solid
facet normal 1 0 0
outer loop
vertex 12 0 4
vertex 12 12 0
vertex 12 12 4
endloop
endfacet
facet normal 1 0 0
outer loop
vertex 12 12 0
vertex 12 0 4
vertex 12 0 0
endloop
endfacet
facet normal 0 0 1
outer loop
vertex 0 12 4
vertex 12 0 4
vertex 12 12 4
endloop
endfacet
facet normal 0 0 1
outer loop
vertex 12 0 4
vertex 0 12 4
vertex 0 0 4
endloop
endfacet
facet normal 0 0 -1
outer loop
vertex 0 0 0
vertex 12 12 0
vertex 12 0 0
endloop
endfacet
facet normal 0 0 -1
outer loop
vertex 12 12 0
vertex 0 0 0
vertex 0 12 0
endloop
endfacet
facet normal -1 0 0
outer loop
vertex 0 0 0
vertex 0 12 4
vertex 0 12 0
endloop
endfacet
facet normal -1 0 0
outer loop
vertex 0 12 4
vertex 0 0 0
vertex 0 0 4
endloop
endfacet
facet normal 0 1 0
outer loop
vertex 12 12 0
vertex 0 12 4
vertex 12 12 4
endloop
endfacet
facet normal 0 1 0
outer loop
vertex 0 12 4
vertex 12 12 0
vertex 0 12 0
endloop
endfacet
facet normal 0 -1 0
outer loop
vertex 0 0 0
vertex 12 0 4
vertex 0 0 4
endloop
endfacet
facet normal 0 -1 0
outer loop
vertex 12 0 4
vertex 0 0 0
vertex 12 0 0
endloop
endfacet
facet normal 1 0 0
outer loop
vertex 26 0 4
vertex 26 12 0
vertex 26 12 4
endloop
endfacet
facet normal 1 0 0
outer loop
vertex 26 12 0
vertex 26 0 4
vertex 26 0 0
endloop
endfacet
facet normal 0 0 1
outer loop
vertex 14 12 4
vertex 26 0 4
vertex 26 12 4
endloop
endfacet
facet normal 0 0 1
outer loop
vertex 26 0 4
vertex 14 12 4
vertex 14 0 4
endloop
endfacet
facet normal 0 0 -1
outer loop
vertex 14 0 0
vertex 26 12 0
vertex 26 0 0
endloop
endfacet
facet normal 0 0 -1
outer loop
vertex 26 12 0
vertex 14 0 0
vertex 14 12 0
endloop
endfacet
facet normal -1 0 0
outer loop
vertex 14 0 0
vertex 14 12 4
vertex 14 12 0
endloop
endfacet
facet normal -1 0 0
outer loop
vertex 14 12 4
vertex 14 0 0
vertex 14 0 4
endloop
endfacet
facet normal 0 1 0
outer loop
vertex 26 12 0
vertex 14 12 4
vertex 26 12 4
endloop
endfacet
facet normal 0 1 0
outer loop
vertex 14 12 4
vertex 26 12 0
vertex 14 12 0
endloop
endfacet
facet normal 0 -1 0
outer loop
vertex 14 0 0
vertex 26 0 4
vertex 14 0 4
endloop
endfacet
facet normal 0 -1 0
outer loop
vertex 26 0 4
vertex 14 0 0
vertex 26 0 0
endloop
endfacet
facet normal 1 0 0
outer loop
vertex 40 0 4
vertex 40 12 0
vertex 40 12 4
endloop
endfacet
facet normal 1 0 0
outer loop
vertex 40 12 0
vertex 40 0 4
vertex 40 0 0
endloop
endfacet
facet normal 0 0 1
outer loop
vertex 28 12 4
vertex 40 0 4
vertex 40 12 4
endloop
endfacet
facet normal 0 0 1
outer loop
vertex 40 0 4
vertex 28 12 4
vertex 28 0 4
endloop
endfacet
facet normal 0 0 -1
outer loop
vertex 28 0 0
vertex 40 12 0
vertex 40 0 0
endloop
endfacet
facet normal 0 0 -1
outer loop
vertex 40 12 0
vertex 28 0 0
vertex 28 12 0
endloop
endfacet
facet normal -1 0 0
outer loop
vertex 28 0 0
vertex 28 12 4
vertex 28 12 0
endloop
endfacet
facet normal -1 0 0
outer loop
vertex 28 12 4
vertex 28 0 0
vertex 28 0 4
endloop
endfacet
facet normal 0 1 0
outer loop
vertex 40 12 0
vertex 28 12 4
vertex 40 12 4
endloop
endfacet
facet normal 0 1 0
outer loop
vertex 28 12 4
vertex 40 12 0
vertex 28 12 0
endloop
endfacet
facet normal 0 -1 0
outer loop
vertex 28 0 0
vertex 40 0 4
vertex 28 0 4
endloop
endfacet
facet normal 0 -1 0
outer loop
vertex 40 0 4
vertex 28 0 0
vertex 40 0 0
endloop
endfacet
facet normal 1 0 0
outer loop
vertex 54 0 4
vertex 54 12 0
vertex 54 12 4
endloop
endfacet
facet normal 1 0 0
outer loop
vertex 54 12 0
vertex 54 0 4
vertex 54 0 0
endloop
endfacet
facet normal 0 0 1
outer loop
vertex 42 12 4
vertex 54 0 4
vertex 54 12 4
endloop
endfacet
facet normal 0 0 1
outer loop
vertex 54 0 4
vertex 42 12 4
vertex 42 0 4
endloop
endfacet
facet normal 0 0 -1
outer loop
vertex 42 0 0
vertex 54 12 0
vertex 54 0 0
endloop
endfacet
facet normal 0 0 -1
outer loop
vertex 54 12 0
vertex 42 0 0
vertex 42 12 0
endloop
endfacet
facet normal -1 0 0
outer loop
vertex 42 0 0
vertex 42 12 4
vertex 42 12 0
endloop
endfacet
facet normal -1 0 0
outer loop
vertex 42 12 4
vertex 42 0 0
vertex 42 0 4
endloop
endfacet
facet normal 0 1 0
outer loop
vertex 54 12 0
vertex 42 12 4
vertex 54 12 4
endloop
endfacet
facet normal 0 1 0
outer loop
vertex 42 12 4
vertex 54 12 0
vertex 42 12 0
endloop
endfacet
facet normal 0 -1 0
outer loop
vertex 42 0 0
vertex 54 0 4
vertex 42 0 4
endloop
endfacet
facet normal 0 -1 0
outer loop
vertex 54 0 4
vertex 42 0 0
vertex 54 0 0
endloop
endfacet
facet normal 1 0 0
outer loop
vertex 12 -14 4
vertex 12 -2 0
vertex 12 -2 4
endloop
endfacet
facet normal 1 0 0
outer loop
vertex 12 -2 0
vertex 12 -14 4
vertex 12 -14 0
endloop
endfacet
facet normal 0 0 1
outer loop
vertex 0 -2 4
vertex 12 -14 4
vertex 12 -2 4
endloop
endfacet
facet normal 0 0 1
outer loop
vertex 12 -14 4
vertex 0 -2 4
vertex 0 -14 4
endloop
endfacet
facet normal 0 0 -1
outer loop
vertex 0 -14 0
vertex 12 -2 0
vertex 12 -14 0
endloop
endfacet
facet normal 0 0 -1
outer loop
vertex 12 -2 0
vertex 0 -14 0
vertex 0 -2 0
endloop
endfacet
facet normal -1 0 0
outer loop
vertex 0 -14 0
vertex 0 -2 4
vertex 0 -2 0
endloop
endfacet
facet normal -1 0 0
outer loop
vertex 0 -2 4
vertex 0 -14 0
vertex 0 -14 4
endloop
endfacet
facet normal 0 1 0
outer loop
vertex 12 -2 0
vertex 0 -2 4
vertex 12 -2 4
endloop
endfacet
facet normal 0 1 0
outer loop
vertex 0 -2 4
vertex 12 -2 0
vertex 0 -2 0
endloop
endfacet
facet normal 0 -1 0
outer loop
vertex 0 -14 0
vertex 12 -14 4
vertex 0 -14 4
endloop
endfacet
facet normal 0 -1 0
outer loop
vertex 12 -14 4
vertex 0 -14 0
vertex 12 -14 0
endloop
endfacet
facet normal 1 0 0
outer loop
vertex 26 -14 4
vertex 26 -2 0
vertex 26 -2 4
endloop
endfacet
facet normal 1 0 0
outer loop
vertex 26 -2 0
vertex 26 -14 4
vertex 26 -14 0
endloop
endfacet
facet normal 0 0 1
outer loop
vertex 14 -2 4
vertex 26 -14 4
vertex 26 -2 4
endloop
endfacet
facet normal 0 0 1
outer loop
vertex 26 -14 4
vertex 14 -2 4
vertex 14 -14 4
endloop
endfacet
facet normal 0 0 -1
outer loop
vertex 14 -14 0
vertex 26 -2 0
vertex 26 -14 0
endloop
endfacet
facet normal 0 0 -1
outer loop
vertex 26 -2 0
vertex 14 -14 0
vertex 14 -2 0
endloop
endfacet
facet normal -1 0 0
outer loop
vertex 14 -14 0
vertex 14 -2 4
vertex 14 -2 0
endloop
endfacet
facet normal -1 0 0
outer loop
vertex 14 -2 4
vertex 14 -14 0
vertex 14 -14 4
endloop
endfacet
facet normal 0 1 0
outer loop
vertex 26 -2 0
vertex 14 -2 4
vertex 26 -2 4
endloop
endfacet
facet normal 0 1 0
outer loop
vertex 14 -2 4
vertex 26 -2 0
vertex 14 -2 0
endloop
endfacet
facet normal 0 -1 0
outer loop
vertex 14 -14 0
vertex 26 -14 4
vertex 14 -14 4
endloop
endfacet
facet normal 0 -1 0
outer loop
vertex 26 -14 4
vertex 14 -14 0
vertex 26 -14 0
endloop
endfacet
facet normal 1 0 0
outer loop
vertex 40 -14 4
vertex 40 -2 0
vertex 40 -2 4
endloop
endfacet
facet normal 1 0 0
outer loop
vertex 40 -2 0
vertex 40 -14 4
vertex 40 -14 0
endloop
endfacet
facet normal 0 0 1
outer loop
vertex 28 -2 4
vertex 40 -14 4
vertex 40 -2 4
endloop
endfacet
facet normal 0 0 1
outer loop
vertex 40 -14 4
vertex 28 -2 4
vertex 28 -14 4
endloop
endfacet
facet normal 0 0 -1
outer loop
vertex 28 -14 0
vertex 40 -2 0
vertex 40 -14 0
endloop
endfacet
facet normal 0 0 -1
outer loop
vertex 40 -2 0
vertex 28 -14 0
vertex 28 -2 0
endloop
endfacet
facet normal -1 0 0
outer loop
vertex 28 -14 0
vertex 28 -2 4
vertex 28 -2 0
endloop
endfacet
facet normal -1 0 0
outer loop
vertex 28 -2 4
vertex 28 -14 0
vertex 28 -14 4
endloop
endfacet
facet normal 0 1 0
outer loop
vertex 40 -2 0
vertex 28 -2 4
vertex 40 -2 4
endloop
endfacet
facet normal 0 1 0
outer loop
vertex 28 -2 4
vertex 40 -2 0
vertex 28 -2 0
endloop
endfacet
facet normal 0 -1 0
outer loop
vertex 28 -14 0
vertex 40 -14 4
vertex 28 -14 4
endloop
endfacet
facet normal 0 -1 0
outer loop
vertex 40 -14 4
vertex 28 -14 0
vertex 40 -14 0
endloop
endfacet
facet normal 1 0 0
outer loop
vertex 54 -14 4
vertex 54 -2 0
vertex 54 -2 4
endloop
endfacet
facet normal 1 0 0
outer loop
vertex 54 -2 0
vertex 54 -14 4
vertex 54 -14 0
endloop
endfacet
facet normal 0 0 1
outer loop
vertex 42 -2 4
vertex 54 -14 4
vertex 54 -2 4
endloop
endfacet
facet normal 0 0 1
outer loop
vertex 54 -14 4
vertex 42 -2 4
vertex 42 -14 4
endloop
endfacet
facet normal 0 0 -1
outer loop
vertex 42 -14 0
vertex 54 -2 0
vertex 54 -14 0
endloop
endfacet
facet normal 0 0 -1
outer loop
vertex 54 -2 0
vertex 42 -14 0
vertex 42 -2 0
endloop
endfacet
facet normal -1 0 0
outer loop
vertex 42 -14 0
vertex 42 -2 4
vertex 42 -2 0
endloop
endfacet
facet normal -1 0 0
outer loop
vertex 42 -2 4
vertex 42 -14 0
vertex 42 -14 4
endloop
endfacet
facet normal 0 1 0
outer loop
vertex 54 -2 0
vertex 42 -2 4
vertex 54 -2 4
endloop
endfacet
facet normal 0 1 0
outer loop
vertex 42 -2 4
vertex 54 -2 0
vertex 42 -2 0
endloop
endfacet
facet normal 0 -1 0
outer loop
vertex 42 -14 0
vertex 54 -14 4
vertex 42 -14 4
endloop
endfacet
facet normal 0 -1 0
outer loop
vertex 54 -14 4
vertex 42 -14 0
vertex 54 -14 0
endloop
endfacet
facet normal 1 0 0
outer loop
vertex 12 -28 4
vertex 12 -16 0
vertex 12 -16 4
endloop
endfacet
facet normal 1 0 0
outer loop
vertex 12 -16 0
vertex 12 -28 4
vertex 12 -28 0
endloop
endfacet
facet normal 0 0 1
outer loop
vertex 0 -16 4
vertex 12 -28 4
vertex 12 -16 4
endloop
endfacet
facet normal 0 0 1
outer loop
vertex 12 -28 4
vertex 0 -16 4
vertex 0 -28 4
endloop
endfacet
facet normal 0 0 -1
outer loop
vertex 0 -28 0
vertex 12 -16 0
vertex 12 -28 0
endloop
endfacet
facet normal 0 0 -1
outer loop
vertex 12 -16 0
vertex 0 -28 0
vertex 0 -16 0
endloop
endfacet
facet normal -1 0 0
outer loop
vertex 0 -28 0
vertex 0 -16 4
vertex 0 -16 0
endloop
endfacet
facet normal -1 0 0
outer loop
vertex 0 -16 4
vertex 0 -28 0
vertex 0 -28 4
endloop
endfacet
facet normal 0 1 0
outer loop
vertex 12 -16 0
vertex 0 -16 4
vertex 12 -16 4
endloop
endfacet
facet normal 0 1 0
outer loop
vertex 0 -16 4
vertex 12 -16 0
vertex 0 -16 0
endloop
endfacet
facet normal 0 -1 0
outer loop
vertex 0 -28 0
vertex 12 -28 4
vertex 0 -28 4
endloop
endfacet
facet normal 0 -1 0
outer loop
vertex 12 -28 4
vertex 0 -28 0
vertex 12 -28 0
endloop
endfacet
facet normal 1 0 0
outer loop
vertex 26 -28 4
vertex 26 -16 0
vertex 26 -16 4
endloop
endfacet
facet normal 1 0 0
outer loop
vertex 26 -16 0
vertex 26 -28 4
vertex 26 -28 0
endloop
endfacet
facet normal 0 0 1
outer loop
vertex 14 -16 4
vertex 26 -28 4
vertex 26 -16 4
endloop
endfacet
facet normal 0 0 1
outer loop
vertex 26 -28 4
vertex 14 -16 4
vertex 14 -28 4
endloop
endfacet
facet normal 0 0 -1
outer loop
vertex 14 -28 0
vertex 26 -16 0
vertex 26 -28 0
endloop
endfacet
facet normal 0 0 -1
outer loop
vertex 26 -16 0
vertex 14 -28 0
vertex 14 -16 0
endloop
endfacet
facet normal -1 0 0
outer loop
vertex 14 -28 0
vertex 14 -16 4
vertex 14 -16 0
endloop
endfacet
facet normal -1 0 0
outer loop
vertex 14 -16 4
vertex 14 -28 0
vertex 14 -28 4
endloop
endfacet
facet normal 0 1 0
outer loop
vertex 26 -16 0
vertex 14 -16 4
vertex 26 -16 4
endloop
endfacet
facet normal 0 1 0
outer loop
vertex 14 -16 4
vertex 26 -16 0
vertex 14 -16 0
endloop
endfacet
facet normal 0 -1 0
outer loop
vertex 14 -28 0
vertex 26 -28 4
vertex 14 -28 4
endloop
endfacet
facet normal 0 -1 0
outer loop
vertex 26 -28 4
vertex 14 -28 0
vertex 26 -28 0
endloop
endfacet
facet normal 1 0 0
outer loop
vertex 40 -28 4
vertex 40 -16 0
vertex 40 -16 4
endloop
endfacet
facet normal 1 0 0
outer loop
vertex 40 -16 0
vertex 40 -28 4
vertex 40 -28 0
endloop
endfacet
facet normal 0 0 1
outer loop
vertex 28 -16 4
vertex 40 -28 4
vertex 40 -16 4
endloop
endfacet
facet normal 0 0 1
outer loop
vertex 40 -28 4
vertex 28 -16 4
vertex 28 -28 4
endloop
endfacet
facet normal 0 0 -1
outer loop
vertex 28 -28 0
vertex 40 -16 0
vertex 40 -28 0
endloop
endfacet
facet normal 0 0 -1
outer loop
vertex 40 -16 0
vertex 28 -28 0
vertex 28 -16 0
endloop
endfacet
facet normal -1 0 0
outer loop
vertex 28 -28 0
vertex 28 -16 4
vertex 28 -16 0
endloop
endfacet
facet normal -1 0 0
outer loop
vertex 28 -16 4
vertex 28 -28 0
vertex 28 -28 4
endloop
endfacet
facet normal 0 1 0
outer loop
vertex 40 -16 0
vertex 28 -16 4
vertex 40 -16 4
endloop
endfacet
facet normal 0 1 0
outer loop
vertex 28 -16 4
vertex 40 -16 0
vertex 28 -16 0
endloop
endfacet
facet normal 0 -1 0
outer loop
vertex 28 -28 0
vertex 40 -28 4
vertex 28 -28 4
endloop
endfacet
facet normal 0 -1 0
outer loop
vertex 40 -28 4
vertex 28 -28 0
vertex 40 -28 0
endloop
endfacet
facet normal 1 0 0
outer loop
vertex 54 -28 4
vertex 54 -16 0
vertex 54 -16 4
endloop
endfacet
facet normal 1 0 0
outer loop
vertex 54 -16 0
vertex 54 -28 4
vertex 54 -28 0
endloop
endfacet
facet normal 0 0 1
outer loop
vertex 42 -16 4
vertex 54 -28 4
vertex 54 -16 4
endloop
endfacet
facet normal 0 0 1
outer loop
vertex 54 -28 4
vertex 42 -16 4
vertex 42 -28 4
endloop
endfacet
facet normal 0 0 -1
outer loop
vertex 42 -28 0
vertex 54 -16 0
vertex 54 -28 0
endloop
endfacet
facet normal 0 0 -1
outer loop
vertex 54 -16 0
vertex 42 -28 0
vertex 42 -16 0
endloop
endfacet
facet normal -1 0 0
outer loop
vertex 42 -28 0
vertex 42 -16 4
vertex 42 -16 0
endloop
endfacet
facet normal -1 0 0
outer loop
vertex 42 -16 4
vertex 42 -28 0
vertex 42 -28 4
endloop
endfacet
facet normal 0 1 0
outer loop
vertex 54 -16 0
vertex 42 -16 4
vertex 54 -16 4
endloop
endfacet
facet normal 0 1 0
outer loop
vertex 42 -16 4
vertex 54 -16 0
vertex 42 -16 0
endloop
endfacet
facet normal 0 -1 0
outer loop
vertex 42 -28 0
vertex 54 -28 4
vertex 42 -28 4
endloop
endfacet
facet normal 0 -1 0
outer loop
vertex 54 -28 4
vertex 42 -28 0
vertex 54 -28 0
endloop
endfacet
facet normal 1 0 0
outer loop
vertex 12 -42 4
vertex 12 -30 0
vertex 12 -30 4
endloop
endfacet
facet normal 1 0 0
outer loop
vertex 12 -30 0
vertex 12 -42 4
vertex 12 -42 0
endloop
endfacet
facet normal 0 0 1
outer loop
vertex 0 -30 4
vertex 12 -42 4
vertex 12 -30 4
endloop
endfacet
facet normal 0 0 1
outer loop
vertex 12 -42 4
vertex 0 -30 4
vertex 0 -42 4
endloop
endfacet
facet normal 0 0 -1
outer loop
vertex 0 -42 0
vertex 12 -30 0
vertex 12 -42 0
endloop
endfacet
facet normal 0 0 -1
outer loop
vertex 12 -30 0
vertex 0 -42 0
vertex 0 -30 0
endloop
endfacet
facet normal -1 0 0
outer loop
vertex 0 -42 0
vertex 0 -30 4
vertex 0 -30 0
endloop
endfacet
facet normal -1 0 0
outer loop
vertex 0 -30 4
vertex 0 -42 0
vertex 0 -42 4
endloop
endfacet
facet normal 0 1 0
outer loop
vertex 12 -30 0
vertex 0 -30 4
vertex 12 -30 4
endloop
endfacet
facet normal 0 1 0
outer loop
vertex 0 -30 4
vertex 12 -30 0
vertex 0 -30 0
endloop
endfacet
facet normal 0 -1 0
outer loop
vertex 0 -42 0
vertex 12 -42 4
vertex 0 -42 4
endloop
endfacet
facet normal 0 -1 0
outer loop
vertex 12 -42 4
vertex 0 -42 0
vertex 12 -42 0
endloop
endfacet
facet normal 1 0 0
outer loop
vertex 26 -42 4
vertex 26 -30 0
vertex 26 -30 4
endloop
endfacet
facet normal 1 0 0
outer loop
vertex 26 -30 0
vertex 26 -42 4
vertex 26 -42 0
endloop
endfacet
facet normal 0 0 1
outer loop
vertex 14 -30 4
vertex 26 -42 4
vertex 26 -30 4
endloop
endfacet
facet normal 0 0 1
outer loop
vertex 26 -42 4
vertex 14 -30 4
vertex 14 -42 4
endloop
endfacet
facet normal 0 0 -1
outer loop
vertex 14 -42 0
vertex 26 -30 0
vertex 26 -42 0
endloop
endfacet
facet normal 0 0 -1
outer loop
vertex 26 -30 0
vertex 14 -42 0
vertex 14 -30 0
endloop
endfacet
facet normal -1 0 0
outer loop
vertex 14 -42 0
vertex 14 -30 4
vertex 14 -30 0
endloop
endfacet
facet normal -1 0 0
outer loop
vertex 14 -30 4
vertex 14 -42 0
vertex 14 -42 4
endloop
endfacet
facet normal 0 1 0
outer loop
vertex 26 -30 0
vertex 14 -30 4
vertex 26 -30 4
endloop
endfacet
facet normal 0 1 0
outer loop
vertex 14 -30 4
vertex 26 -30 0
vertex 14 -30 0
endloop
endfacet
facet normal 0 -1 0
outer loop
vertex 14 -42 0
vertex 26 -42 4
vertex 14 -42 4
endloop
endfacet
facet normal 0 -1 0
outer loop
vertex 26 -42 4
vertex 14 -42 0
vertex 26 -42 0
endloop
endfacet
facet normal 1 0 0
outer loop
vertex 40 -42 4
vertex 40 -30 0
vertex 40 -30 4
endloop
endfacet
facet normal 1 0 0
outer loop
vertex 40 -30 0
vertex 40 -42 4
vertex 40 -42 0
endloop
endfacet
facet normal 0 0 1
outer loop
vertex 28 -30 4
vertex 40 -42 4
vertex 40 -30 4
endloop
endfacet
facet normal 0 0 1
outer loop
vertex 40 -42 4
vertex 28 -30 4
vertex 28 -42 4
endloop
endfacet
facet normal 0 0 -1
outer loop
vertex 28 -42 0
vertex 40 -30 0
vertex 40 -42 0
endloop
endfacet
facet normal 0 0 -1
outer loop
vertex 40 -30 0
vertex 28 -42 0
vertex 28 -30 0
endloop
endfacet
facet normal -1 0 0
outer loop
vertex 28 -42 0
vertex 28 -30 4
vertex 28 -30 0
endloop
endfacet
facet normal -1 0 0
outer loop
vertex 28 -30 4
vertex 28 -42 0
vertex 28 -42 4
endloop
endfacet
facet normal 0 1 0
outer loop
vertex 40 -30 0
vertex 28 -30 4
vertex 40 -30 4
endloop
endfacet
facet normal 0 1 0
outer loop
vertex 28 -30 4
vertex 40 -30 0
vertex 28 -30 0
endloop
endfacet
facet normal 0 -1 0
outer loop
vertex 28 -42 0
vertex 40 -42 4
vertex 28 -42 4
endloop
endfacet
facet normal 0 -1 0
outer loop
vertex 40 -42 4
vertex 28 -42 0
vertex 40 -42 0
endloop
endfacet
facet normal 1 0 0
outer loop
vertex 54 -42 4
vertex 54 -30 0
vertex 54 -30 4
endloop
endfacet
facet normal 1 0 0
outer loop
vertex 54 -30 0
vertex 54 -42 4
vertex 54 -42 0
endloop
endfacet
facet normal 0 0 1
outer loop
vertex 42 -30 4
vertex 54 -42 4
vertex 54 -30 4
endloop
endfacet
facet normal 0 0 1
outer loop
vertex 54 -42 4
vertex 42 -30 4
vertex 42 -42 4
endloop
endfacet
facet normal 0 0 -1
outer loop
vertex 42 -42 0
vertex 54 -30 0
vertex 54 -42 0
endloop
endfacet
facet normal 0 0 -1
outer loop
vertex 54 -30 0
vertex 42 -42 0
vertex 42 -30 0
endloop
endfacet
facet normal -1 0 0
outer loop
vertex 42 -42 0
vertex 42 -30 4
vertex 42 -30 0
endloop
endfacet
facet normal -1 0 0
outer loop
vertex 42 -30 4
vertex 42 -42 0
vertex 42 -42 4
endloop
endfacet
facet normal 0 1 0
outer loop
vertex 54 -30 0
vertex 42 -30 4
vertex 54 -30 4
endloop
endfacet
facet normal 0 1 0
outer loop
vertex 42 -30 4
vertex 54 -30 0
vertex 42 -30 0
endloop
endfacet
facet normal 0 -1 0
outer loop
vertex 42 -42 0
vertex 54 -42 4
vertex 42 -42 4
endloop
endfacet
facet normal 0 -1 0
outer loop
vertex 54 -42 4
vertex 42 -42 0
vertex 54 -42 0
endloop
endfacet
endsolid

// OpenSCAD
names = ["red","orange","yellow","lime","green","teal","cyan","blue","purple","magenta","pink","brown","black","gray","silver","white"];
for (i = [0:15]) color(names[i]) translate([(i % 4) * 14, -floor(i / 4) * 14, 0]) cube([12, 12, 4]);
